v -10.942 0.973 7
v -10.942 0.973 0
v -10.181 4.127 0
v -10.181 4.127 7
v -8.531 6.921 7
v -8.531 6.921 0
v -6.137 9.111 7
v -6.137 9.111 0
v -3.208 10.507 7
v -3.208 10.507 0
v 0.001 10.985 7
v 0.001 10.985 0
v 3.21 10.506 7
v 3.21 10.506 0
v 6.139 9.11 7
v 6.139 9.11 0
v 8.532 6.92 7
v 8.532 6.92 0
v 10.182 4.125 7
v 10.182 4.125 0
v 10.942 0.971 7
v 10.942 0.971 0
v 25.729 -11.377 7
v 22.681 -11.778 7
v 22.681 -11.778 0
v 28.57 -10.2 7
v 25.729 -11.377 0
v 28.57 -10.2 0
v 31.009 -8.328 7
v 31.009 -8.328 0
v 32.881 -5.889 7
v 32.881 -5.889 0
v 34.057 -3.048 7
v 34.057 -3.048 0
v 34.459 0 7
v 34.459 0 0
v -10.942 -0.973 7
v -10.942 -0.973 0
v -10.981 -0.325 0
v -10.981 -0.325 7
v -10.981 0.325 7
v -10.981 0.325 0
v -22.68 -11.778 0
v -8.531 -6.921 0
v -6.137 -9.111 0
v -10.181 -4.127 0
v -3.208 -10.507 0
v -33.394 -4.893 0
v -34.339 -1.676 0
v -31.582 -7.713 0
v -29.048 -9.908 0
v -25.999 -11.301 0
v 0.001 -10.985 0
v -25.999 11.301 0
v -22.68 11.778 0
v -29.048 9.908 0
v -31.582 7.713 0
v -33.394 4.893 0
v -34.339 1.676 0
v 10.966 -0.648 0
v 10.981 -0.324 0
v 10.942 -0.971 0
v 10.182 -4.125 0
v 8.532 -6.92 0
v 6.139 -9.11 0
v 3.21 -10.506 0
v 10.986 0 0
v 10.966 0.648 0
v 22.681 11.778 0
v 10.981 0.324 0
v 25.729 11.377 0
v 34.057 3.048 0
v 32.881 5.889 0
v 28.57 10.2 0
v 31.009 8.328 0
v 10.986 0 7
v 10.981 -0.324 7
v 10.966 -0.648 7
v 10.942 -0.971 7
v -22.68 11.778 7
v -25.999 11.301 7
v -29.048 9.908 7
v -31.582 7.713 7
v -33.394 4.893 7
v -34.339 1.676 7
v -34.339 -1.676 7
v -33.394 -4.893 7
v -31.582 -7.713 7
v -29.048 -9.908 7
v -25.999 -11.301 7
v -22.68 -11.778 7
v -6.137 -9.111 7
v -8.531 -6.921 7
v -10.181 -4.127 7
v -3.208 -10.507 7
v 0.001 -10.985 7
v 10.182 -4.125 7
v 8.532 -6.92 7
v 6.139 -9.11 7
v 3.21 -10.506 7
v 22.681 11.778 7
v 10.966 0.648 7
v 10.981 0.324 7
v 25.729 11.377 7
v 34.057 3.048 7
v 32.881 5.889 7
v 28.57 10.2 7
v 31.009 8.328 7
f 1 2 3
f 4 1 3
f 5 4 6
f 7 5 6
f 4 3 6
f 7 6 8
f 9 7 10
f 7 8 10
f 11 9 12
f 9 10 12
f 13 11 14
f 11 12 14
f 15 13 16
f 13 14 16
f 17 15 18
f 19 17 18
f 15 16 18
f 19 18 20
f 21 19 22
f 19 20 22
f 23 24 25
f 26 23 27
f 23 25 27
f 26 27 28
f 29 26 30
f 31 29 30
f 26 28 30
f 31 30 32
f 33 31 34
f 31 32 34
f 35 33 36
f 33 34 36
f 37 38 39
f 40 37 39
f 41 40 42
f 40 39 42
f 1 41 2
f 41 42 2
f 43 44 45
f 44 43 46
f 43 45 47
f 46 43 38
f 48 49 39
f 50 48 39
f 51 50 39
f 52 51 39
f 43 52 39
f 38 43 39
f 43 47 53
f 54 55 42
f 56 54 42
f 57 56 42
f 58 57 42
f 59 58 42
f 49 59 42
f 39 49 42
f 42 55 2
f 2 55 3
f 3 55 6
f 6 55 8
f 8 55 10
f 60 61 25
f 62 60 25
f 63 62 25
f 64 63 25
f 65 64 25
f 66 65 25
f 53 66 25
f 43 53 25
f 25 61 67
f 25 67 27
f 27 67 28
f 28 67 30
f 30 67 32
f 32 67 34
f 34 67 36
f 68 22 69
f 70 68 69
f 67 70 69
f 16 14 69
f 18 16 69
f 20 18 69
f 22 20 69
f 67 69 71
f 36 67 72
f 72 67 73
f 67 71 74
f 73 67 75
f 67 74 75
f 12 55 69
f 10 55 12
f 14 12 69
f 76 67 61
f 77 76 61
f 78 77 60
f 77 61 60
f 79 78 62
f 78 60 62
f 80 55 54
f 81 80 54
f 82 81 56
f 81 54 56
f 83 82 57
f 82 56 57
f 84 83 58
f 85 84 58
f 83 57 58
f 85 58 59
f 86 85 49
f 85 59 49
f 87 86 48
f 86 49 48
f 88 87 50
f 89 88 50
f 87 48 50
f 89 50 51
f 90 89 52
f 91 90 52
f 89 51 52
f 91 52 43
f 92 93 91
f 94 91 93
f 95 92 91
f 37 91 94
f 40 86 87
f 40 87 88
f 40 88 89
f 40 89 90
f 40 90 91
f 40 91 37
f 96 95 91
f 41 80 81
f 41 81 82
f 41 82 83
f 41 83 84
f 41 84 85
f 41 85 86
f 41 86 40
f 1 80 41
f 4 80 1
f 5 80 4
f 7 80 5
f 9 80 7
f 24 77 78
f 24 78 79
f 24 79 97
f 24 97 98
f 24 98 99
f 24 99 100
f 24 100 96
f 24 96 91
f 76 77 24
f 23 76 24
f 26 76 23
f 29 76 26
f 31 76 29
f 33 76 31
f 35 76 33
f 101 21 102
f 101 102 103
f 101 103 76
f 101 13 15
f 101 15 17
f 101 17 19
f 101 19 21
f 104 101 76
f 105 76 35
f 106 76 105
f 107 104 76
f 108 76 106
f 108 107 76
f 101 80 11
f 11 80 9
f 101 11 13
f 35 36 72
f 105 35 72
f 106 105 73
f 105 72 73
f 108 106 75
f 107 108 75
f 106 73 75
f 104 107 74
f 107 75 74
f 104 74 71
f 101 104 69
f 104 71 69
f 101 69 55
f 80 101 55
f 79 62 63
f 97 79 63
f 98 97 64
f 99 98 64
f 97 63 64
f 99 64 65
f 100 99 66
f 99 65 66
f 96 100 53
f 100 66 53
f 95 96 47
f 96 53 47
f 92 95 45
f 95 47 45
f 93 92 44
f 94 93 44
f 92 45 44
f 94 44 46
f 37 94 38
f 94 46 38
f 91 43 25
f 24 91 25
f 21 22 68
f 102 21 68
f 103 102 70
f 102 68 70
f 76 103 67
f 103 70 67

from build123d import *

# Parameters (mm, degrees)
F1_DEPTH = 7


with BuildPart() as f1:
    # F0 (on Top) → F1 (new body)
    with BuildSketch(Plane.XY):
        with BuildLine():
            ThreePointArc((10.9424882845, 0.9711644524), (10.9747418033, 0.4860582273), (10.9855, 0))
            ThreePointArc((10.9855, 0), (10.9747418033, -0.4860582273), (10.9424882845, -0.9711644524))
            ThreePointArc((10.9424882845, -0.9711644524), (14.7028715464, -8.6649815834), (22.6805508137, -11.7781693116))
            Line((22.6805508137, -11.7781693116), (22.6805508137, -10.9855))
            ThreePointArc((22.6805508137, -10.9855), (11.6950508137, 0), (22.6805508137, 10.9855))
            Line((22.6805508137, 10.9855), (22.6805508137, 11.7781693116))
            ThreePointArc((22.6805508137, 11.7781693116), (14.7028715464, 8.6649815834), (10.9424882845, 0.9711644524))
        make_face()
        with BuildLine():
            ThreePointArc((-10.9423311539, 0.9729332804), (0.0008878968, 10.9854999641), (10.9424882845, 0.9711644524))
            ThreePointArc((10.9424882845, 0.9711644524), (14.7028715464, 8.6649815834), (22.6805508137, 11.7781693116))
            Line((22.6805508137, 11.7781693116), (-22.6802472025, 11.7781693116))
            ThreePointArc((-22.6802472025, 11.7781693116), (-14.7032208322, 8.6655826474), (-10.9423311539, 0.9729332804))
        make_face()
        with BuildLine():
            ThreePointArc((22.6805508137, -11.7781693116), (14.7028715464, -8.6649815834), (10.9424882845, -0.9711644524))
            ThreePointArc((10.9424882845, -0.9711644524), (0.0008878968, -10.9854999641), (-10.9423311539, -0.9729332804))
            ThreePointArc((-10.9423311539, -0.9729332804), (-14.7032208322, -8.6655826474), (-22.6802472025, -11.7781693116))
            Line((-22.6802472025, -11.7781693116), (22.6805508137, -11.7781693116))
        make_face()
        with BuildLine():
            ThreePointArc((-10.9423311539, -0.9729332804), (-10.9855, 0), (-10.9423311539, 0.9729332804))
            ThreePointArc((-10.9423311539, 0.9729332804), (-14.7032208322, 8.6655826474), (-22.6802472025, 11.7781693116))
            Line((-22.6802472025, 11.7781693116), (-22.6802472025, 10.9855))
            ThreePointArc((-22.6802472025, 10.9855), (-14.9123256578, 7.7679215447), (-11.6947472025, 0))
            ThreePointArc((-11.6947472025, 0), (-14.9123256578, -7.7679215447), (-22.6802472025, -10.9855))
            Line((-22.6802472025, -10.9855), (-22.6802472025, -11.7781693116))
            ThreePointArc((-22.6802472025, -11.7781693116), (-14.7032208322, -8.6655826474), (-10.9423311539, -0.9729332804))
        make_face()
        with BuildLine():
            ThreePointArc((34.4587201253, 0), (31.0089742039, 8.3284233902), (22.6805508137, 11.7781693116))
            Line((22.6805508137, 11.7781693116), (22.6805508137, 10.9855))
            ThreePointArc((22.6805508137, 10.9855), (30.4484723584, 7.7679215447), (33.6660508137, 0))
            ThreePointArc((33.6660508137, 0), (30.4484723584, -7.7679215447), (22.6805508137, -10.9855))
            Line((22.6805508137, -10.9855), (22.6805508137, -11.7781693116))
            ThreePointArc((22.6805508137, -11.7781693116), (31.0089742039, -8.3284233902), (34.4587201253, 0))
        make_face()
        with BuildLine():
            Line((-22.6802472025, 10.9855), (-22.6802472025, 11.7781693116))
            ThreePointArc((-22.6802472025, 11.7781693116), (-34.4584165141, 0), (-22.6802472025, -11.7781693116))
            Line((-22.6802472025, -11.7781693116), (-22.6802472025, -10.9855))
            ThreePointArc((-22.6802472025, -10.9855), (-33.6657472025, 0), (-22.6802472025, 10.9855))
        make_face()
        with BuildLine():
            Line((-22.6802472025, -10.9855), (-22.6802472025, 10.9855))
            ThreePointArc((-22.6802472025, 10.9855), (-33.6657472025, 0), (-22.6802472025, -10.9855))
        make_face()
        with BuildLine():
            ThreePointArc((-11.6947472025, 0), (-14.9123256578, 7.7679215447), (-22.6802472025, 10.9855))
            Line((-22.6802472025, 10.9855), (-22.6802472025, -10.9855))
            ThreePointArc((-22.6802472025, -10.9855), (-14.9123256578, -7.7679215447), (-11.6947472025, 0))
        make_face()
        with BuildLine():
            Line((22.6805508137, -10.9855), (22.6805508137, 10.9855))
            ThreePointArc((22.6805508137, 10.9855), (11.6950508137, 0), (22.6805508137, -10.9855))
        make_face()
        with BuildLine():
            ThreePointArc((33.6660508137, 0), (30.4484723584, 7.7679215447), (22.6805508137, 10.9855))
            Line((22.6805508137, 10.9855), (22.6805508137, -10.9855))
            ThreePointArc((22.6805508137, -10.9855), (30.4484723584, -7.7679215447), (33.6660508137, 0))
        make_face()
    extrude(amount=F1_DEPTH)


solid = f1.part
